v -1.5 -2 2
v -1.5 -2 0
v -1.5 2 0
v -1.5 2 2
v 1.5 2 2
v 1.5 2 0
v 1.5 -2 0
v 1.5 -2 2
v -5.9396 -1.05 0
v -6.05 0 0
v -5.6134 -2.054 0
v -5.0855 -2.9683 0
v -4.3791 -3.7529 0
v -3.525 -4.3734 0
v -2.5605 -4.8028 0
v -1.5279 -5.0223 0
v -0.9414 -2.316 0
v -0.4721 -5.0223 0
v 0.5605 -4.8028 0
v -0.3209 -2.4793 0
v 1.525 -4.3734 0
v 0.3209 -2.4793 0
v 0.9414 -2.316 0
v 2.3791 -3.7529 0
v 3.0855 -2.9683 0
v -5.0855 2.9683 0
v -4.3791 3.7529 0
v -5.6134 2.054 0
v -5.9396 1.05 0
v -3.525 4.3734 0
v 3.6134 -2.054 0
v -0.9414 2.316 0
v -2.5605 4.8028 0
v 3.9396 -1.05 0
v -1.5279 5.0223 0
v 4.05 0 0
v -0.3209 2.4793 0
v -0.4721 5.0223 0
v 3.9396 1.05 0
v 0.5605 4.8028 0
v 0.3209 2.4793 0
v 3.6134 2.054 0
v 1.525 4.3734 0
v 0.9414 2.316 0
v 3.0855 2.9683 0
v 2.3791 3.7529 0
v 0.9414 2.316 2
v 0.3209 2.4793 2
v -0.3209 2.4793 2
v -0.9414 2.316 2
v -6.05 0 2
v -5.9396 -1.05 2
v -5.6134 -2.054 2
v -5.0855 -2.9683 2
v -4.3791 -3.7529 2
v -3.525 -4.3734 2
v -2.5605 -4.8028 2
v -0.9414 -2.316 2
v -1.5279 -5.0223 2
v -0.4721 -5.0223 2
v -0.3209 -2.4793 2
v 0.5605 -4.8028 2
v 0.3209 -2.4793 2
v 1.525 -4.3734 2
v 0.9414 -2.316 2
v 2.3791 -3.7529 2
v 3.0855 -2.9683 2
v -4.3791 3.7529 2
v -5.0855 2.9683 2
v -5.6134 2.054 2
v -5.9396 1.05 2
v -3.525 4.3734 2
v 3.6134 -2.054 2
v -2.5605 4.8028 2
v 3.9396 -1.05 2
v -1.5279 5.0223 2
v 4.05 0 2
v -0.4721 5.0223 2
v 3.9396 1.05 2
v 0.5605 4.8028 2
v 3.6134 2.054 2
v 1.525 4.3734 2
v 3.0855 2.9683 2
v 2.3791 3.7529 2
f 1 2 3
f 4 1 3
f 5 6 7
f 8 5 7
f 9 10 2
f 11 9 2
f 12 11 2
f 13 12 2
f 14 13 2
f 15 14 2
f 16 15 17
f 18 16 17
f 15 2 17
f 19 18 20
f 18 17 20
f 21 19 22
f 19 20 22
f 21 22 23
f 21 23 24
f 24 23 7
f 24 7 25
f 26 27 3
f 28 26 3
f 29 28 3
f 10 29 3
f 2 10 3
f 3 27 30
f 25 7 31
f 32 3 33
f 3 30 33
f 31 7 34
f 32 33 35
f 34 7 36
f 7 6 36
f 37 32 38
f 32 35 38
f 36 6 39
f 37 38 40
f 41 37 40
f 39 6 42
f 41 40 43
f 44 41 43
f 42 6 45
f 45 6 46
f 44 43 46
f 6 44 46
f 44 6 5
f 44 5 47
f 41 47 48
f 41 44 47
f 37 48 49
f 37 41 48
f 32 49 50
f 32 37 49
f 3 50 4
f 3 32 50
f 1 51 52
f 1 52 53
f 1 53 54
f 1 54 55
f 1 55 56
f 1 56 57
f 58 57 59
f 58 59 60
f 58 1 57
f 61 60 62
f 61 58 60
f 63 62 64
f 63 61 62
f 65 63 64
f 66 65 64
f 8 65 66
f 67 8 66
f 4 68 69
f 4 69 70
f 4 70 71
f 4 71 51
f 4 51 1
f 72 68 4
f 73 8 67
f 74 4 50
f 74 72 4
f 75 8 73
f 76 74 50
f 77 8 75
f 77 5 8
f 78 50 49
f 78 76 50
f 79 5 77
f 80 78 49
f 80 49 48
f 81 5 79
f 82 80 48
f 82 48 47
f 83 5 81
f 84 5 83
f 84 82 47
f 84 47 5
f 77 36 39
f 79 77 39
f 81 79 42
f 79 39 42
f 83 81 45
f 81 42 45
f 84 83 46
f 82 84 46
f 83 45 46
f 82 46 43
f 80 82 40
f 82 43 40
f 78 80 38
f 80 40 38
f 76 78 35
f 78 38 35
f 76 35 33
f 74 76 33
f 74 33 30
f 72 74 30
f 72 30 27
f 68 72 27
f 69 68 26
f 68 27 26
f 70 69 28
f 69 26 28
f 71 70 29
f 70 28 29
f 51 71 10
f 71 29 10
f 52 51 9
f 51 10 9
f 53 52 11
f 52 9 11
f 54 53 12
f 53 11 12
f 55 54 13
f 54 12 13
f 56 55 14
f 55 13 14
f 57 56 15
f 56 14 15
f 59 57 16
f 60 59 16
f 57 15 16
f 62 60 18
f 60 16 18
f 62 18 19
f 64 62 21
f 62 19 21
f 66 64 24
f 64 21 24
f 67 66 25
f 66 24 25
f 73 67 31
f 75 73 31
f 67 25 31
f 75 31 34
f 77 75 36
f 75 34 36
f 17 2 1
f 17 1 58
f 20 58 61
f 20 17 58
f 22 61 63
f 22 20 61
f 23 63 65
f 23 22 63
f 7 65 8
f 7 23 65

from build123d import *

# Parameters (mm, degrees)
SKETCH002_R       = 5.05
PAD001_DEPTH      = 2
POCKET_DEPTH      = 2
POCKET_DEPTH_BACK = -2


with BuildPart() as part:
    # Sketch002 → Pad001 (new body)
    with BuildSketch(Plane.XY):
        with Locations((-1, 0)):
            Circle(SKETCH002_R)
    extrude(amount=PAD001_DEPTH)

    # Sketch → Pocket (cut, two sides)
    with BuildSketch(Plane.XY) as pocket_sk:
        with BuildLine():
            ThreePointArc((1.5, 2), (0, 2.5), (-1.5, 2))
            Line((-1.5, -2), (-1.5, 2))
            ThreePointArc((-1.5, -2), (0, -2.5), (1.5, -2))
            Line((1.5, 2), (1.5, -2))
        make_face()
    extrude(amount=-POCKET_DEPTH, mode=Mode.SUBTRACT)
    extrude(pocket_sk.sketch, amount=-POCKET_DEPTH_BACK, mode=Mode.SUBTRACT)


solid = part.part
